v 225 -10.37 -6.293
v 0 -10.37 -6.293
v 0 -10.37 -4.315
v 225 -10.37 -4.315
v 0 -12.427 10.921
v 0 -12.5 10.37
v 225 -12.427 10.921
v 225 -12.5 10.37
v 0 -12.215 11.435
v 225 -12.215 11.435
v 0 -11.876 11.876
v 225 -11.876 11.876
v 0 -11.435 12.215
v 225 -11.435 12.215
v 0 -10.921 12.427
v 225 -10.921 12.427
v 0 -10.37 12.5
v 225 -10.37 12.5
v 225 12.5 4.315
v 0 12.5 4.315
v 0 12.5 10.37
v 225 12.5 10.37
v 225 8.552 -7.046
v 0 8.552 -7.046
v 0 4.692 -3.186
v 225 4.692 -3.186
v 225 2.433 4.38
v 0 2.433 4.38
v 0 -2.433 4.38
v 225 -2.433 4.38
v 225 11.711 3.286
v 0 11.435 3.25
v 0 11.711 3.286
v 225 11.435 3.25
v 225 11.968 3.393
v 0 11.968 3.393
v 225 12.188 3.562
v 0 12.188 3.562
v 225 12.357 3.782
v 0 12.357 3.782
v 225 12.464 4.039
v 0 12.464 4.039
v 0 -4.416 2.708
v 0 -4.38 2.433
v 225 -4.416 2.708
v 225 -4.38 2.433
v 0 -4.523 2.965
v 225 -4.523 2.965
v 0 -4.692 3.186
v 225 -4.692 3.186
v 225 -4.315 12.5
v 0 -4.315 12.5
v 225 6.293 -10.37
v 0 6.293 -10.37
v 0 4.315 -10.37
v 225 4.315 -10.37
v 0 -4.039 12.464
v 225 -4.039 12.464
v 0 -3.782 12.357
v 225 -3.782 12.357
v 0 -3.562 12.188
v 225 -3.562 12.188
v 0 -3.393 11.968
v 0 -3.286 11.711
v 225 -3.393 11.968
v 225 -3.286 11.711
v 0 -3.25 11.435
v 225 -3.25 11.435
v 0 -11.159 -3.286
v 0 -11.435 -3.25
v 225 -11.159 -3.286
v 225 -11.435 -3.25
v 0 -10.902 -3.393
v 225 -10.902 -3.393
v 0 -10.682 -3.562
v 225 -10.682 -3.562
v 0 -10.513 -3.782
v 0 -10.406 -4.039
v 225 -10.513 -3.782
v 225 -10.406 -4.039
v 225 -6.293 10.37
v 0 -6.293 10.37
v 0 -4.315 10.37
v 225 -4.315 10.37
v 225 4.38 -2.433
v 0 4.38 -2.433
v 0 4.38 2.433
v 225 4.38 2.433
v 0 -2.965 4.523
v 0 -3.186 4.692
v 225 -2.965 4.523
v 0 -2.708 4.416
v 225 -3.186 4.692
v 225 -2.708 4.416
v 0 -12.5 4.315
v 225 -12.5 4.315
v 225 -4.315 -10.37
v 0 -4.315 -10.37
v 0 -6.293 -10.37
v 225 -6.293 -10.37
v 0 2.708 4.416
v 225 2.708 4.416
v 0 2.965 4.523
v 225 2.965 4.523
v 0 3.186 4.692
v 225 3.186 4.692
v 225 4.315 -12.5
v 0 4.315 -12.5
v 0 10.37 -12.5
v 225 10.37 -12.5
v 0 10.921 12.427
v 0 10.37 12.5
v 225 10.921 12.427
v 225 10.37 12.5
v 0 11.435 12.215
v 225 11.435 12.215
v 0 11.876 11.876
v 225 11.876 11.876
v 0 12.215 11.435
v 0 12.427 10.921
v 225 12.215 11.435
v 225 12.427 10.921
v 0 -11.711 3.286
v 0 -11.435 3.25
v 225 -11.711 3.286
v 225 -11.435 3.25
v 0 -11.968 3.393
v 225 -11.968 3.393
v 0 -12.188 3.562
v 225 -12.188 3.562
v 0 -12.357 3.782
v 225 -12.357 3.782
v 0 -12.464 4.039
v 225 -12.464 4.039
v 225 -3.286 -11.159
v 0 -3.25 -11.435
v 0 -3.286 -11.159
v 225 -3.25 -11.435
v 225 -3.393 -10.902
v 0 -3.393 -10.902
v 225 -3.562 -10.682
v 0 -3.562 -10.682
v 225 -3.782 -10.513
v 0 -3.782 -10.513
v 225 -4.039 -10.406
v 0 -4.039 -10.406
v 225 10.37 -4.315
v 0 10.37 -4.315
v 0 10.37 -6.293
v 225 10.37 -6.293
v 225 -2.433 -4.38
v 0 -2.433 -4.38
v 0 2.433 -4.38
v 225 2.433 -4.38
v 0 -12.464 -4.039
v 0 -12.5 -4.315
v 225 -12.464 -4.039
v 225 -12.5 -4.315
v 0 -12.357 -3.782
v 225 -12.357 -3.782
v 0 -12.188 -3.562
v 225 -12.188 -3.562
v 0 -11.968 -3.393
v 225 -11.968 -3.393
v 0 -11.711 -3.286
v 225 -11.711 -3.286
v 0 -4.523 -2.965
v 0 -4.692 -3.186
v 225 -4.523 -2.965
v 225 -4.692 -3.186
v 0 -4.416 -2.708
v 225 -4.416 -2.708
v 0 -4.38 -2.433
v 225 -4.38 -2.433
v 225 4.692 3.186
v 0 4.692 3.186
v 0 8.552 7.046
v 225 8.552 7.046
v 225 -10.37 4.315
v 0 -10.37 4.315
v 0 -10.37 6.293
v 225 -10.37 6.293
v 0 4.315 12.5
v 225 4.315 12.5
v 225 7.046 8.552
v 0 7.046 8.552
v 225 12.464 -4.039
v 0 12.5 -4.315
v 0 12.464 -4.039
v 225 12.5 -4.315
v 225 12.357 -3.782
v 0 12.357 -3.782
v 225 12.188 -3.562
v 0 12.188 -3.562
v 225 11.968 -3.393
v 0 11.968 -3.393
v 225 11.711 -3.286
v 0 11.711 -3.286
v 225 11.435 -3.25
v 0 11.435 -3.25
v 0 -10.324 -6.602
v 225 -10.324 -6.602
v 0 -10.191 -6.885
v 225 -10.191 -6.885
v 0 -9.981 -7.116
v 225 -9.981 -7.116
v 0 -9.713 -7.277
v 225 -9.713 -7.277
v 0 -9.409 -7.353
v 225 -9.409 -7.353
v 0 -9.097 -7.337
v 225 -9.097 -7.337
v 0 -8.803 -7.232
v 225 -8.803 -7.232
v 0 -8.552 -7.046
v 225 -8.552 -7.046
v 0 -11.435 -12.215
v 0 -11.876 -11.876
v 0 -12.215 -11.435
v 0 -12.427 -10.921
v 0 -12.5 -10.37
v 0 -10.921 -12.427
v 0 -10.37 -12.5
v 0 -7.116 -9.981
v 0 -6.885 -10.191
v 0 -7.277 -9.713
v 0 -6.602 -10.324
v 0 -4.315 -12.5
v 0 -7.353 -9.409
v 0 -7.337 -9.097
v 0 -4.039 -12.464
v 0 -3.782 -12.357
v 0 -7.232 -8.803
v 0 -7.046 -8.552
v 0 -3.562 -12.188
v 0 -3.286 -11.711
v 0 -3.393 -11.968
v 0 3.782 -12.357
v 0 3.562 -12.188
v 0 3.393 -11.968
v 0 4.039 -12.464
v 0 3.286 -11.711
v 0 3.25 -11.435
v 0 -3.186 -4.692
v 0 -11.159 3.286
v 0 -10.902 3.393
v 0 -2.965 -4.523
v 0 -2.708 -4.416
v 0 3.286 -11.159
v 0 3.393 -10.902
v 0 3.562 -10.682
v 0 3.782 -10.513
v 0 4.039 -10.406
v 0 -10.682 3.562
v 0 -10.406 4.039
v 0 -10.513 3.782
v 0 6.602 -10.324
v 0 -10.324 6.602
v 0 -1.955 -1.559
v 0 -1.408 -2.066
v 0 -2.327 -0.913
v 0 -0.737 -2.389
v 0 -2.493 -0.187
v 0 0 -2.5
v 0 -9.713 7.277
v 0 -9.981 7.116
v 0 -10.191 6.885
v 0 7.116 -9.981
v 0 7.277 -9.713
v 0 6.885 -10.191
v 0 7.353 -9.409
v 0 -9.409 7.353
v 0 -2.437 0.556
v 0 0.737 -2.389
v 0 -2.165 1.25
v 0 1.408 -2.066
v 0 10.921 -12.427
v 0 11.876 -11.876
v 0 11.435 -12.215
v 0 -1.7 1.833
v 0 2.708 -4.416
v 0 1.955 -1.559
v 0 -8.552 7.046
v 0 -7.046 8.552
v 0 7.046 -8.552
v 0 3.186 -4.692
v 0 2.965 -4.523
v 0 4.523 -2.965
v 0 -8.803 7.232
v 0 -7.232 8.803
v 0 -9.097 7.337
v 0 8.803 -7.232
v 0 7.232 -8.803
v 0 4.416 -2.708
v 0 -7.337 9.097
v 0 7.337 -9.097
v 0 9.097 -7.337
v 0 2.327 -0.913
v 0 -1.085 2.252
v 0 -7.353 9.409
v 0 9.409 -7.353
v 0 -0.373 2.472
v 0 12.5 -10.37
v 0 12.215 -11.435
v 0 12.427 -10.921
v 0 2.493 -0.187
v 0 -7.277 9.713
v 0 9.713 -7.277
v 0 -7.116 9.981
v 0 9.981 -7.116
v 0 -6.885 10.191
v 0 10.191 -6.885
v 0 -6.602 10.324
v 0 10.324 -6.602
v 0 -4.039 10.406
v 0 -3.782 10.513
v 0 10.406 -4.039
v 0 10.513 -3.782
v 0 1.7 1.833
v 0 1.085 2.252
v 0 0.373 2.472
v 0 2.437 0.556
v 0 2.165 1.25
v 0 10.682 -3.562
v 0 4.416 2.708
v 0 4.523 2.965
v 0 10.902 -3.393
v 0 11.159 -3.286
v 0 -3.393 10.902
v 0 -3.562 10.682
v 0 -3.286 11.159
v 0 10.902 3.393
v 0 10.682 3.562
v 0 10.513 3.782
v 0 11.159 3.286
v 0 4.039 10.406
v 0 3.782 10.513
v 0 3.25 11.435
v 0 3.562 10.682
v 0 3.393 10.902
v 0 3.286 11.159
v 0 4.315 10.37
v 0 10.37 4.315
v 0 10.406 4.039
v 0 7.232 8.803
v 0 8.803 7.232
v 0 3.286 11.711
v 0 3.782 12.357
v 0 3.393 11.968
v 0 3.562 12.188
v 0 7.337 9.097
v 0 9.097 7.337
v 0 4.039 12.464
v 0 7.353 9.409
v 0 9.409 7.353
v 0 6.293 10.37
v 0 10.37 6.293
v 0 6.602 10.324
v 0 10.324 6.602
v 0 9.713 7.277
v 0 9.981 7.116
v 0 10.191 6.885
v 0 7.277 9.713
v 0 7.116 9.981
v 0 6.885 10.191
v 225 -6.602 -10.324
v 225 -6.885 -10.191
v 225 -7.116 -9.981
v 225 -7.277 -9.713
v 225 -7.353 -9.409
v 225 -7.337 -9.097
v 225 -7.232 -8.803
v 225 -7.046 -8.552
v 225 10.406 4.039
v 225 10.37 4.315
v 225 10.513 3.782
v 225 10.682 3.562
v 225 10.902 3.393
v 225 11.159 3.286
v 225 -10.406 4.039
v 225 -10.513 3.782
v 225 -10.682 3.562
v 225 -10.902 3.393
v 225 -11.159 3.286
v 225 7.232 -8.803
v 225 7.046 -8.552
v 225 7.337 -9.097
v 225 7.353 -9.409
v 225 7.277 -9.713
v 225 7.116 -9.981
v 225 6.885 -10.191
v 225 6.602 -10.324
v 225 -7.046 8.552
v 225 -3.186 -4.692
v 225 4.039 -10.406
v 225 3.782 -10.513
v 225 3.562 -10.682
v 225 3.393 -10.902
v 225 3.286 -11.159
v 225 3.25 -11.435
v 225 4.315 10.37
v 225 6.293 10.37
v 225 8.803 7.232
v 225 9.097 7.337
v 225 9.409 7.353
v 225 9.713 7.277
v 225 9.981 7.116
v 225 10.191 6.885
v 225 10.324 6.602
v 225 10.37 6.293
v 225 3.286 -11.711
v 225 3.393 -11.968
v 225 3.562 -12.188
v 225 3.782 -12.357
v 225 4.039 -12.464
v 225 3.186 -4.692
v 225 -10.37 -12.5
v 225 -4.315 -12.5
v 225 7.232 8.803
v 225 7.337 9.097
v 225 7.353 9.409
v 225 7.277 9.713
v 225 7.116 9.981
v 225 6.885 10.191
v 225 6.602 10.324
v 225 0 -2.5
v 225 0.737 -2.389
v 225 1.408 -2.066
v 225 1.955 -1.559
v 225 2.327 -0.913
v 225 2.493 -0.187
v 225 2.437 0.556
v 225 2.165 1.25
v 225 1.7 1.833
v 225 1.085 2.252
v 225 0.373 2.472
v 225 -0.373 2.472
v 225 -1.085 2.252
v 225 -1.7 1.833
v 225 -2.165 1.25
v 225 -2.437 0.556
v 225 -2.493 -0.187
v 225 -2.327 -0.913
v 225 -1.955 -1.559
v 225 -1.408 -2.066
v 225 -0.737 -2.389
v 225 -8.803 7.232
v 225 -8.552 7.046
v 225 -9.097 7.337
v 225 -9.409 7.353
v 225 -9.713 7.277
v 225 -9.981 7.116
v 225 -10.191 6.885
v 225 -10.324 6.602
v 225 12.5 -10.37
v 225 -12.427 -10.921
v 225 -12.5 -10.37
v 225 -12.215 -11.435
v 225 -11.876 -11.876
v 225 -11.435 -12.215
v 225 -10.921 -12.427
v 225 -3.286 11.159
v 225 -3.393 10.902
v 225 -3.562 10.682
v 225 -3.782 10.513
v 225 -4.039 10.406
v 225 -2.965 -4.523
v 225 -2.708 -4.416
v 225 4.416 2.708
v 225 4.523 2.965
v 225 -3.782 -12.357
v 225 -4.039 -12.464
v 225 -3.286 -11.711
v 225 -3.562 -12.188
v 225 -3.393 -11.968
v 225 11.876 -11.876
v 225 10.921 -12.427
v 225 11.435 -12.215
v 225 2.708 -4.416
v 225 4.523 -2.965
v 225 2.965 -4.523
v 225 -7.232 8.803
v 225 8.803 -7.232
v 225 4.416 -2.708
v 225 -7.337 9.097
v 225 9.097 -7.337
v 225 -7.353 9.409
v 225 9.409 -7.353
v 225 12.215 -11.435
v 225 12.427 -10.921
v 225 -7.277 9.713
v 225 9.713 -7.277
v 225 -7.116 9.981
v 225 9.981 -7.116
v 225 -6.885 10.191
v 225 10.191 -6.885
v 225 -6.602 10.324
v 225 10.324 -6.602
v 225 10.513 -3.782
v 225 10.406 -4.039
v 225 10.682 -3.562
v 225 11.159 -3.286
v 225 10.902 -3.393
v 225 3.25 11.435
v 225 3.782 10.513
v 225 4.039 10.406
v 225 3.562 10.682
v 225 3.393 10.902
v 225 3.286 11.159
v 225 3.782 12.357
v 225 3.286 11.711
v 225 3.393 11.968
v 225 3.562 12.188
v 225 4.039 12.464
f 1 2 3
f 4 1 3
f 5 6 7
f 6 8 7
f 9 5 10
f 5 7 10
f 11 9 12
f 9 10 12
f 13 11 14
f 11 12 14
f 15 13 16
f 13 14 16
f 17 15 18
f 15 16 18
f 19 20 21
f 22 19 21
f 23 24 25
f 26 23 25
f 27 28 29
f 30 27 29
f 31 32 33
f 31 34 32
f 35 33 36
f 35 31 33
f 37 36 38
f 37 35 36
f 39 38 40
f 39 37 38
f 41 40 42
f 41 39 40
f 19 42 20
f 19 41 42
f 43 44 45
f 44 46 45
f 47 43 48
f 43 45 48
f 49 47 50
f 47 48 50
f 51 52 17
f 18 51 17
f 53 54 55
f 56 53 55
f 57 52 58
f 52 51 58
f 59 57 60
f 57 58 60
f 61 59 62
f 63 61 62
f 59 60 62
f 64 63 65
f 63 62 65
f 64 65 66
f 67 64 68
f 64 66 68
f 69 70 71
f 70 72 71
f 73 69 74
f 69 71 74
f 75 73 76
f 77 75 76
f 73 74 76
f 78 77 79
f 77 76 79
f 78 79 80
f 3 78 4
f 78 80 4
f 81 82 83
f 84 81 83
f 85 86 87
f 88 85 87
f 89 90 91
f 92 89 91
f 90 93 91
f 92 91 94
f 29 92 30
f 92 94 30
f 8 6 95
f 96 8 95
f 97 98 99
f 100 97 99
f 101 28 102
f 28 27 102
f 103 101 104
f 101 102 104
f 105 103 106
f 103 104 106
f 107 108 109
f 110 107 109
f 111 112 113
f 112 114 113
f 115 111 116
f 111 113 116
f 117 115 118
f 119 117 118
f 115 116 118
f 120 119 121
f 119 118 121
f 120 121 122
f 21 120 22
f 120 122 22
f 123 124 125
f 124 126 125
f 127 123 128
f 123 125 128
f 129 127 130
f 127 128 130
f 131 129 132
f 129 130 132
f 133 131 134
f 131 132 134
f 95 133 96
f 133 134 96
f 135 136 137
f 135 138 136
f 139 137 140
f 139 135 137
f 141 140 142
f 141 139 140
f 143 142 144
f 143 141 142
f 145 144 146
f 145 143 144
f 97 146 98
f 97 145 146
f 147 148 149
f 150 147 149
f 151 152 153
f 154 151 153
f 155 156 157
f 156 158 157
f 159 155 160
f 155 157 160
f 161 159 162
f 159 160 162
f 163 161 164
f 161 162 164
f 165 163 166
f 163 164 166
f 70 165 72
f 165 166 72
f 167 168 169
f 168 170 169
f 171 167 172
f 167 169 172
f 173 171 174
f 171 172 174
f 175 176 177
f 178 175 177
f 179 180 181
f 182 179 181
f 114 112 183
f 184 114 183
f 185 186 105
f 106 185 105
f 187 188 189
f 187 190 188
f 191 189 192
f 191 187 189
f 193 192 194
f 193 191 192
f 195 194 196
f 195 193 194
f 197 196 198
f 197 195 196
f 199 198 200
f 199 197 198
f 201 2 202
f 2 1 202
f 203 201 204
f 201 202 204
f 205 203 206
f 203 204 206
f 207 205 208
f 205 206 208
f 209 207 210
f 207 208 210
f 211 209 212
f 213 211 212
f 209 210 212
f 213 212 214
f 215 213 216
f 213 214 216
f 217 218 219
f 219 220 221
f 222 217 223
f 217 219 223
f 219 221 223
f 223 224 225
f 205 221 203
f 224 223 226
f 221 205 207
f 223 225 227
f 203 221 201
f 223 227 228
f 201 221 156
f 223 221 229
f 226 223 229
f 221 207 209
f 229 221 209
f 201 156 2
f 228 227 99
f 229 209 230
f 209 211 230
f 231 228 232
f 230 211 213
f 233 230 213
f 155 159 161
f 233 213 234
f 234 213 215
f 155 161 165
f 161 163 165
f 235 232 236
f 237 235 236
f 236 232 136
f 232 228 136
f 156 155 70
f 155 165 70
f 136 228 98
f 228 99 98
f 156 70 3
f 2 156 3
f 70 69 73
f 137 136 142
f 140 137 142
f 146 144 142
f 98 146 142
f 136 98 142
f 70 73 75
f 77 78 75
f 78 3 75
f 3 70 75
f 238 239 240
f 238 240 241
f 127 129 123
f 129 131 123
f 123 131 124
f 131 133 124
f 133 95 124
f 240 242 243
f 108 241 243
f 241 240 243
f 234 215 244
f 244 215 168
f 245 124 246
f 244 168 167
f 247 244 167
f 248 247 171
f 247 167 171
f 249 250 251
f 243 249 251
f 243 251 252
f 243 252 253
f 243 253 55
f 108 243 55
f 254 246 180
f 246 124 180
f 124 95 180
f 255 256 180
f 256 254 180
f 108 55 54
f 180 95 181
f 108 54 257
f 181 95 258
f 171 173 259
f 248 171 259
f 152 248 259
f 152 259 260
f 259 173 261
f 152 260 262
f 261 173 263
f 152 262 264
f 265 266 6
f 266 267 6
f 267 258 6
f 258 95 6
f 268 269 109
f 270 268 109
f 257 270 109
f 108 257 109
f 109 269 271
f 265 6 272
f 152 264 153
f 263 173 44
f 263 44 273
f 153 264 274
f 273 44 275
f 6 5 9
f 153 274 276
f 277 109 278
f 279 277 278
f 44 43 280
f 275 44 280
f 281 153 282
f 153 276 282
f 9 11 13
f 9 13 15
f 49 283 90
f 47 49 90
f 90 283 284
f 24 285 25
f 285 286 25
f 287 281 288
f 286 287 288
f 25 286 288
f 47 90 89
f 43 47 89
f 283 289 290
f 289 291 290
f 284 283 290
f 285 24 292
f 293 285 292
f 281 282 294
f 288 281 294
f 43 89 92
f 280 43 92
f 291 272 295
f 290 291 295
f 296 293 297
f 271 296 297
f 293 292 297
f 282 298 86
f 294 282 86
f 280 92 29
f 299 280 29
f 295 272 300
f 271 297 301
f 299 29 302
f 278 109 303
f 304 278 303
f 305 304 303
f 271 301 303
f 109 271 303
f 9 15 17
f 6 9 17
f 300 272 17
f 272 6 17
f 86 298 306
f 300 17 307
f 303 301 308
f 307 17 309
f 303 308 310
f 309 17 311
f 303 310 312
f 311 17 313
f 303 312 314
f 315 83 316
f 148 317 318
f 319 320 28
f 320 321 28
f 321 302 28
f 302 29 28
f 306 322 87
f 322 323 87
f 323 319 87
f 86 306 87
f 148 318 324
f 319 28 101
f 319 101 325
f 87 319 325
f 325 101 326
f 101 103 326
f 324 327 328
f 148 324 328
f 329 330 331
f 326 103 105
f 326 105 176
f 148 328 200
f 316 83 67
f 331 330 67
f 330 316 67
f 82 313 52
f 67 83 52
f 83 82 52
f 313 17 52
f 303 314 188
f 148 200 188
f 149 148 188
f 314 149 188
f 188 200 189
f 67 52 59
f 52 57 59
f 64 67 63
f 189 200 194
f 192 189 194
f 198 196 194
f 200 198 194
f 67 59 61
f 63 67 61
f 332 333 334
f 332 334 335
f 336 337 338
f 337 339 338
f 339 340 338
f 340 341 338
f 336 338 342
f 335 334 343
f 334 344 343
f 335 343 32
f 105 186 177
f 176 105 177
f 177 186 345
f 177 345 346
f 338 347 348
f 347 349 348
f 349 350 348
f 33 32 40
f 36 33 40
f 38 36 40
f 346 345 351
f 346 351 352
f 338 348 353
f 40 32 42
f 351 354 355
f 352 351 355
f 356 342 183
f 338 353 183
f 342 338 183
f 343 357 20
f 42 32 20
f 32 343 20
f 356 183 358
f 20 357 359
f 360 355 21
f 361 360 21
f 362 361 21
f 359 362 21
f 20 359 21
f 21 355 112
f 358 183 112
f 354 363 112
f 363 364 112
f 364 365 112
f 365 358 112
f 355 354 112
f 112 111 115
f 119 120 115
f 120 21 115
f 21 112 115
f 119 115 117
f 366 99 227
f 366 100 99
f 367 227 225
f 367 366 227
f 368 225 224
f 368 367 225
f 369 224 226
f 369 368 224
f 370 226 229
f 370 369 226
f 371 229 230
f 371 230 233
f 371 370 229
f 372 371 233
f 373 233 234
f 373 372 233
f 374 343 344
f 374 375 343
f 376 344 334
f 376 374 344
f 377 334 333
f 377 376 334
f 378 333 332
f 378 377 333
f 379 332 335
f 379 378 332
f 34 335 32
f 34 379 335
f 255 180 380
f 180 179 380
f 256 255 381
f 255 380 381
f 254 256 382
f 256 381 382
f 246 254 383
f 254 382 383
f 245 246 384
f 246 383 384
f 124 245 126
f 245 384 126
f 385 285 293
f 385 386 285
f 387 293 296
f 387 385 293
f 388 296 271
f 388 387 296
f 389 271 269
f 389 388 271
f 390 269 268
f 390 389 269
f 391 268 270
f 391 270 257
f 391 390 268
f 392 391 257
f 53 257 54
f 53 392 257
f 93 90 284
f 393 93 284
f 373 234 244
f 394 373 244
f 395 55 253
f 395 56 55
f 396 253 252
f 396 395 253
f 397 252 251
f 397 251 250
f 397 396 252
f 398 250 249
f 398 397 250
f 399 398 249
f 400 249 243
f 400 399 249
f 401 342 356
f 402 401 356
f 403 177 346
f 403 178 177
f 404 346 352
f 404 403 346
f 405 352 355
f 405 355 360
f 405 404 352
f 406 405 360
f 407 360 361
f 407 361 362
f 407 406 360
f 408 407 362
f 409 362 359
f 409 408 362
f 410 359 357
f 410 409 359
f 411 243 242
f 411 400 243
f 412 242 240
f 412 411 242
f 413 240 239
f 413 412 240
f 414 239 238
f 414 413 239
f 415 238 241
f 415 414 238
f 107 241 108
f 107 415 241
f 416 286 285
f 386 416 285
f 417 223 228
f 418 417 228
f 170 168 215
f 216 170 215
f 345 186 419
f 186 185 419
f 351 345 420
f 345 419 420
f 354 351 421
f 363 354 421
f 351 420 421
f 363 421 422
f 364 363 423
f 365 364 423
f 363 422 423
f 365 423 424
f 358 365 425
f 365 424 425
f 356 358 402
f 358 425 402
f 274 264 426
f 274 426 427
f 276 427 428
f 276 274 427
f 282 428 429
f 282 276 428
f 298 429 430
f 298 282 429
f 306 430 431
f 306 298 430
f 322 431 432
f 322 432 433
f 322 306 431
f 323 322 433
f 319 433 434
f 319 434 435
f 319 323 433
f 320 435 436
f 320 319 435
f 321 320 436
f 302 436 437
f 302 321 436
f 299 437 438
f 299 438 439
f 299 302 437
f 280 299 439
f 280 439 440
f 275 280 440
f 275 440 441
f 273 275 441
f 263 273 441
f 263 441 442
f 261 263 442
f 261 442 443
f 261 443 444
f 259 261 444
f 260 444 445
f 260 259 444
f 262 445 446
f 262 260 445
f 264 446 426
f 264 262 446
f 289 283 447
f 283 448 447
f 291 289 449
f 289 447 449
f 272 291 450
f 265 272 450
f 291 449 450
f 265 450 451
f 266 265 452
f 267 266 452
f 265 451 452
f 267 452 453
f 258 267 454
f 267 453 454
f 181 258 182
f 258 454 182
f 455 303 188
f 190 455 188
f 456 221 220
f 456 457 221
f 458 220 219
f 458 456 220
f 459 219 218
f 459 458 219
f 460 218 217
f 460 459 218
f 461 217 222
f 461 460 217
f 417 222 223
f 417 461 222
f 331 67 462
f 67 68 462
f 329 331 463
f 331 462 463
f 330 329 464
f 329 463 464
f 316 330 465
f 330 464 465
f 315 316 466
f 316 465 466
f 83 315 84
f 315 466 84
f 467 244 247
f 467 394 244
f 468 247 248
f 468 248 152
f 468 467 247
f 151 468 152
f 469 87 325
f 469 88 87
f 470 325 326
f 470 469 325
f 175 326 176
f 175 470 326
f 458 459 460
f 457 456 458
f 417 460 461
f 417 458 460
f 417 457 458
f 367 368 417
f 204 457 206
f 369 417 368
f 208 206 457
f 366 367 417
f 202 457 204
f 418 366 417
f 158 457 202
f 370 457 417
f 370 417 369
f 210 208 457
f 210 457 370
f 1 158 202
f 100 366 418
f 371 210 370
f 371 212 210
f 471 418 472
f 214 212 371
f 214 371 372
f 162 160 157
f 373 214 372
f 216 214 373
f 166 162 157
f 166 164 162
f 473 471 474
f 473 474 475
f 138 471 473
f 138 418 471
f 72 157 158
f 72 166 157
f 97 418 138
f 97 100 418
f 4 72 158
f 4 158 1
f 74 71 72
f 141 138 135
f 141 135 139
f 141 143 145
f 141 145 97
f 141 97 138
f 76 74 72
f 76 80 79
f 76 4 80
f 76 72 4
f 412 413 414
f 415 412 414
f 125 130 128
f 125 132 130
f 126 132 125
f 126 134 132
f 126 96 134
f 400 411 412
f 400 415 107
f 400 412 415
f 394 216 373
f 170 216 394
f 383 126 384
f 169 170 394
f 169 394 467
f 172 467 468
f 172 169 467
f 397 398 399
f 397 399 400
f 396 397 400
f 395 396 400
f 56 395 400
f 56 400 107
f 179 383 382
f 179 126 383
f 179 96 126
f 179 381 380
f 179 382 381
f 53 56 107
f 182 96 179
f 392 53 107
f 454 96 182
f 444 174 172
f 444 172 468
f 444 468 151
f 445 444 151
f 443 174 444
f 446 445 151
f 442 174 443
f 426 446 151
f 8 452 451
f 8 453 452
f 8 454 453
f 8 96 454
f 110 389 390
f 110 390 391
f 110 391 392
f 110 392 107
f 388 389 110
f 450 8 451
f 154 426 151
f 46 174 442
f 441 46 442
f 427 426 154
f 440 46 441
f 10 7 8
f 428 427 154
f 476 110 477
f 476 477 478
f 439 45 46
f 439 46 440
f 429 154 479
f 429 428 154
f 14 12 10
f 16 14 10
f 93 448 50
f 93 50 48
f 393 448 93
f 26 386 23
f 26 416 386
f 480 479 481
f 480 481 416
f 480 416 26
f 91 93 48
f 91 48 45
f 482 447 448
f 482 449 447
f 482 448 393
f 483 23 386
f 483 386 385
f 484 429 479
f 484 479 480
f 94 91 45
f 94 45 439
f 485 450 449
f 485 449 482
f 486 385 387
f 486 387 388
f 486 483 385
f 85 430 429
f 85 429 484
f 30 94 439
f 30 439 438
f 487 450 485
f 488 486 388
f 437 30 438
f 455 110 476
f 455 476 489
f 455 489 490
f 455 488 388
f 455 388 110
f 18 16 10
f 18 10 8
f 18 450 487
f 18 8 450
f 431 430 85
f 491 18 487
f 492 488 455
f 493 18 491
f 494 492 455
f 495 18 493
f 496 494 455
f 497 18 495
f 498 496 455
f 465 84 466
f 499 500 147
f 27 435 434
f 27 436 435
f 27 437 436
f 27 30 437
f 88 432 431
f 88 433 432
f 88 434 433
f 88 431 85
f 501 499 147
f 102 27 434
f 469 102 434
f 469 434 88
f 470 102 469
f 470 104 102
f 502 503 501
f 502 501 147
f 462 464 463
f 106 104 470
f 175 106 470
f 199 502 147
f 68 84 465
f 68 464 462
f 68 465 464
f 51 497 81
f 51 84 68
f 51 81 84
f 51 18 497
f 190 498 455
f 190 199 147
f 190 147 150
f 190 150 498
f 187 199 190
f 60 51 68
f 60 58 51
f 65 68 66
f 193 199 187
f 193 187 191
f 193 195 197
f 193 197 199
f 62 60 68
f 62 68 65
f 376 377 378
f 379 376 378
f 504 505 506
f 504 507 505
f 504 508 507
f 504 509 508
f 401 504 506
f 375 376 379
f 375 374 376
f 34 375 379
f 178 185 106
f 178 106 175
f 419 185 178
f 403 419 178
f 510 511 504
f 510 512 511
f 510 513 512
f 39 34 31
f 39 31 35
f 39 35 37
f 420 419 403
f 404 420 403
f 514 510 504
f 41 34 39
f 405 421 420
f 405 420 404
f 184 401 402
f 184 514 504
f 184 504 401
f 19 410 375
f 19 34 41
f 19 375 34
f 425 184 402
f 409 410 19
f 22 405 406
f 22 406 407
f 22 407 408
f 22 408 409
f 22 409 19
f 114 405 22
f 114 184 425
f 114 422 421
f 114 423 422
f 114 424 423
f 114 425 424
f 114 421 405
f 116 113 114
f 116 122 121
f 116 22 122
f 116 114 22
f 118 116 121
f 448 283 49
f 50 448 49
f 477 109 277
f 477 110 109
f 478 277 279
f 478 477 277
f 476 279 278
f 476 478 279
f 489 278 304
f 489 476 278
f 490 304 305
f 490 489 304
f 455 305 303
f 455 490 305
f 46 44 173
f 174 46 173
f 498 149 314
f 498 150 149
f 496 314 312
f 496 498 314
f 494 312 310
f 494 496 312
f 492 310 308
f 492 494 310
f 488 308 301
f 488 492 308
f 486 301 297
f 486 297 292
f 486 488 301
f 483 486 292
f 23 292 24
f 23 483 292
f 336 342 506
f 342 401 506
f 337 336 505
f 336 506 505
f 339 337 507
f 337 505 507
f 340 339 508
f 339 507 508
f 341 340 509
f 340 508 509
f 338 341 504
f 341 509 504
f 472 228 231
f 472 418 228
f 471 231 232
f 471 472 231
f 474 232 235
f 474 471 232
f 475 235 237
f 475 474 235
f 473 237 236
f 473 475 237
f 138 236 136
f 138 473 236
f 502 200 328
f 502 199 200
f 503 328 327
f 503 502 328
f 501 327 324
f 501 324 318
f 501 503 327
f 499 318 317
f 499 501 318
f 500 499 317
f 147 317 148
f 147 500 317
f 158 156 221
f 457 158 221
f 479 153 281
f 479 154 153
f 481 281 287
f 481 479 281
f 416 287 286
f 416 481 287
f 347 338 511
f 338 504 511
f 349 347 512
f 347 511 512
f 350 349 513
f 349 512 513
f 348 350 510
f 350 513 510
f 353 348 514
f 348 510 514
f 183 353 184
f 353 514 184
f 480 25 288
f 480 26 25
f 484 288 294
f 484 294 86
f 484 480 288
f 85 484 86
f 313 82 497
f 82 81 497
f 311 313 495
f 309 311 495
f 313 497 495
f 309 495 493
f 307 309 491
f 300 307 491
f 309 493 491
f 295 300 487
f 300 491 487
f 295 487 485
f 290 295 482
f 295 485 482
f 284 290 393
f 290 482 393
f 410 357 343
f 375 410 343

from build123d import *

# Parameters (mm, degrees)
SKETCH1_R           = 2.5
BOSS_EXTRUDE1_DEPTH = 225
FILLET1_R           = 1.065
FILLET2_R           = 2.13


with BuildPart() as part:
    # Sketch1 → Boss-Extrude1 (new body)
    with BuildSketch(Plane.YZ):
        Polygon((-12.5, -3.25), (-12.5, -12.5), (-3.25, -12.5), (-3.25, -10.37), (-8.863862556, -10.37), (-2.873862556, -4.38), (2.873862556, -4.38), (8.863862556, -10.37), (3.25, -10.37), (3.25, -12.5), (12.5, -12.5), (12.5, -3.25), (10.37, -3.25), (10.37, -8.863862556), (4.38, -2.873862556), (4.38, 2.873862556), (10.37, 8.863862556), (10.37, 3.25), (12.5, 3.25), (12.5, 12.5), (3.25, 12.5), (3.25, 10.37), (8.863862556, 10.37), (2.873862556, 4.38), (-2.873862556, 4.38), (-8.863862556, 10.37), (-3.25, 10.37), (-3.25, 12.5), (-12.5, 12.5), (-12.5, 3.25), (-10.37, 3.25), (-10.37, 8.863862556), (-4.38, 2.873862556), (-4.38, -2.873862556), (-10.37, -8.863862556), (-10.37, -3.25), align=None)
        with Locations(Location((0, 0, 0), (0, 0, 270))):
            Circle(SKETCH1_R, mode=Mode.SUBTRACT)
    extrude(amount=BOSS_EXTRUDE1_DEPTH)

    # Fillet1
    fillet1_edges = [part.edges().sort_by_distance(p)[0] for p in [
        (112.5, -10.37, -8.863862556),
        (112.5, 2.873862556, -4.38),
        (112.5, -2.873862556, -4.38),
        (112.5, -4.38, 2.873862556),
        (112.5, -4.38, -2.873862556),
        (112.5, -2.873862556, 4.38),
        (112.5, 2.873862556, 4.38),
        (112.5, 4.38, 2.873862556),
        (112.5, 4.38, -2.873862556),
        (112.5, -8.863862556, -10.37),
        (112.5, 8.863862556, -10.37),
        (112.5, 10.37, -8.863862556),
        (112.5, -10.37, 8.863862556),
        (112.5, -8.863862556, 10.37),
        (112.5, 10.37, 8.863862556),
        (112.5, 8.863862556, 10.37),
        (112.5, 12.5, 3.25),
        (112.5, -3.25, -12.5),
        (112.5, -10.37, 3.25),
        (112.5, 10.37, 3.25),
        (112.5, -10.37, -3.25),
        (112.5, -12.5, -3.25),
        (112.5, -12.5, 3.25),
        (112.5, 3.25, -10.37),
        (112.5, -3.25, -10.37),
        (112.5, 3.25, -12.5),
        (112.5, 10.37, -3.25),
        (112.5, 12.5, -3.25),
        (112.5, 3.25, 12.5),
        (112.5, 3.25, 10.37),
        (112.5, -3.25, 10.37),
        (112.5, -3.25, 12.5),
    ]]
    fillet(fillet1_edges, radius=FILLET1_R - 0.0001)  # a hair under: the kernel refuses the full size

    # Fillet2
    fillet2_edges = [part.edges().sort_by_distance(p)[0] for p in [
        (112.5, -12.5, 12.5),
        (112.5, 12.5, 12.5),
        (112.5, 12.5, -12.5),
        (112.5, -12.5, -12.5),
    ]]
    fillet(fillet2_edges, radius=FILLET2_R)


solid = part.part
